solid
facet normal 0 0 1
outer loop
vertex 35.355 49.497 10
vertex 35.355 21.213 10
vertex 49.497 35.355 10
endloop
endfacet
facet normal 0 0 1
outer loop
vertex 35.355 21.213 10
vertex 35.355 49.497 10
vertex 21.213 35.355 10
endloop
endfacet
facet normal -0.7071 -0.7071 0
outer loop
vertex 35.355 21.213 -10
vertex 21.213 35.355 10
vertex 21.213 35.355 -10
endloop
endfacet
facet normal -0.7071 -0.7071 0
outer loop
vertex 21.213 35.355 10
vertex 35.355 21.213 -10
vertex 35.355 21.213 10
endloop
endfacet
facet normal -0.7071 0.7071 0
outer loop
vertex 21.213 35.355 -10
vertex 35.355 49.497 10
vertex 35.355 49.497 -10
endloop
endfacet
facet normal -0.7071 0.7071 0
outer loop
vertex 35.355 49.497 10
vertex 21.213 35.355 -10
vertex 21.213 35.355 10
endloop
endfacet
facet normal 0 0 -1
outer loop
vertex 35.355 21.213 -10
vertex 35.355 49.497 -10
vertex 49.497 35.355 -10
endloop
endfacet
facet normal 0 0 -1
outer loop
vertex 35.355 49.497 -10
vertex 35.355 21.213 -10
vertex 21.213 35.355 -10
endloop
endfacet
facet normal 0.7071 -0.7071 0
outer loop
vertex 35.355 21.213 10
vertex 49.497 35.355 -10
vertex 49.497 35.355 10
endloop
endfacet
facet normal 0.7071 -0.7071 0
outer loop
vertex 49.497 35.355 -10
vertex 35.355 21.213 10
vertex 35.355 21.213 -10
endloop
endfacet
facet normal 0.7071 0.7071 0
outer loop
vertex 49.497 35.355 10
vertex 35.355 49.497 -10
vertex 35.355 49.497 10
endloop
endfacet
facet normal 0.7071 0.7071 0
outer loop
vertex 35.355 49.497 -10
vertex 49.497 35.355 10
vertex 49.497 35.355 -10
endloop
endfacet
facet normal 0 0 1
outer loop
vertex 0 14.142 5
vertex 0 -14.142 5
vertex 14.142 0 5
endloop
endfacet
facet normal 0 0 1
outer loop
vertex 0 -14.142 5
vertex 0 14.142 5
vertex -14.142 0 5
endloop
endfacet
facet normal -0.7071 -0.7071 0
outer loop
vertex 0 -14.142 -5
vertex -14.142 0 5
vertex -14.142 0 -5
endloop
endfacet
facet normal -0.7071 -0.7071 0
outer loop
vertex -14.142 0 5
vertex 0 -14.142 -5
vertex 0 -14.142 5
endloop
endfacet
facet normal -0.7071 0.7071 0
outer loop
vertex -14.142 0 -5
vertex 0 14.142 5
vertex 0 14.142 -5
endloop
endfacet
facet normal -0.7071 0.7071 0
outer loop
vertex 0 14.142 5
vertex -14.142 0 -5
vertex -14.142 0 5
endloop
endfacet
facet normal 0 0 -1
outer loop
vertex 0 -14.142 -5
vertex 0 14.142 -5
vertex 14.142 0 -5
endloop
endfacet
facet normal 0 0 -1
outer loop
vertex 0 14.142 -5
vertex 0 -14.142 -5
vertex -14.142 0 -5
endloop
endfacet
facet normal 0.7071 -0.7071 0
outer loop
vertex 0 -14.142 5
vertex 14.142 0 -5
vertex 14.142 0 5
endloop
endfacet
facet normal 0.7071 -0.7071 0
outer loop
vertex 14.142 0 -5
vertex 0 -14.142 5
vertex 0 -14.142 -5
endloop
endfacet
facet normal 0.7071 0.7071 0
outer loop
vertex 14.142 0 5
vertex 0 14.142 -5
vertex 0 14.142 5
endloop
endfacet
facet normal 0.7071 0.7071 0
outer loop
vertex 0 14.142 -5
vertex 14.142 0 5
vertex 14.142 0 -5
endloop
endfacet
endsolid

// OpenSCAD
// Ejemplo de como centrar y transladar un cubo
rotate([0,0,45])    // Las rotaciones SIEMPRE son alrededor del origen del eje de coordenadas
translate([50,0,0])                 // Translada 50mm en el eje X
    cube([20,20,20], center=true);  // Centra el cubo en el eje de coordenadas
    
    
// Ejemplo de como rotar un cubo
rotate([0,0,45])                    // Rotamos 45º en el eje Z
    cube([20,20,10], center= true); // Creamos otro cubo de prueba
